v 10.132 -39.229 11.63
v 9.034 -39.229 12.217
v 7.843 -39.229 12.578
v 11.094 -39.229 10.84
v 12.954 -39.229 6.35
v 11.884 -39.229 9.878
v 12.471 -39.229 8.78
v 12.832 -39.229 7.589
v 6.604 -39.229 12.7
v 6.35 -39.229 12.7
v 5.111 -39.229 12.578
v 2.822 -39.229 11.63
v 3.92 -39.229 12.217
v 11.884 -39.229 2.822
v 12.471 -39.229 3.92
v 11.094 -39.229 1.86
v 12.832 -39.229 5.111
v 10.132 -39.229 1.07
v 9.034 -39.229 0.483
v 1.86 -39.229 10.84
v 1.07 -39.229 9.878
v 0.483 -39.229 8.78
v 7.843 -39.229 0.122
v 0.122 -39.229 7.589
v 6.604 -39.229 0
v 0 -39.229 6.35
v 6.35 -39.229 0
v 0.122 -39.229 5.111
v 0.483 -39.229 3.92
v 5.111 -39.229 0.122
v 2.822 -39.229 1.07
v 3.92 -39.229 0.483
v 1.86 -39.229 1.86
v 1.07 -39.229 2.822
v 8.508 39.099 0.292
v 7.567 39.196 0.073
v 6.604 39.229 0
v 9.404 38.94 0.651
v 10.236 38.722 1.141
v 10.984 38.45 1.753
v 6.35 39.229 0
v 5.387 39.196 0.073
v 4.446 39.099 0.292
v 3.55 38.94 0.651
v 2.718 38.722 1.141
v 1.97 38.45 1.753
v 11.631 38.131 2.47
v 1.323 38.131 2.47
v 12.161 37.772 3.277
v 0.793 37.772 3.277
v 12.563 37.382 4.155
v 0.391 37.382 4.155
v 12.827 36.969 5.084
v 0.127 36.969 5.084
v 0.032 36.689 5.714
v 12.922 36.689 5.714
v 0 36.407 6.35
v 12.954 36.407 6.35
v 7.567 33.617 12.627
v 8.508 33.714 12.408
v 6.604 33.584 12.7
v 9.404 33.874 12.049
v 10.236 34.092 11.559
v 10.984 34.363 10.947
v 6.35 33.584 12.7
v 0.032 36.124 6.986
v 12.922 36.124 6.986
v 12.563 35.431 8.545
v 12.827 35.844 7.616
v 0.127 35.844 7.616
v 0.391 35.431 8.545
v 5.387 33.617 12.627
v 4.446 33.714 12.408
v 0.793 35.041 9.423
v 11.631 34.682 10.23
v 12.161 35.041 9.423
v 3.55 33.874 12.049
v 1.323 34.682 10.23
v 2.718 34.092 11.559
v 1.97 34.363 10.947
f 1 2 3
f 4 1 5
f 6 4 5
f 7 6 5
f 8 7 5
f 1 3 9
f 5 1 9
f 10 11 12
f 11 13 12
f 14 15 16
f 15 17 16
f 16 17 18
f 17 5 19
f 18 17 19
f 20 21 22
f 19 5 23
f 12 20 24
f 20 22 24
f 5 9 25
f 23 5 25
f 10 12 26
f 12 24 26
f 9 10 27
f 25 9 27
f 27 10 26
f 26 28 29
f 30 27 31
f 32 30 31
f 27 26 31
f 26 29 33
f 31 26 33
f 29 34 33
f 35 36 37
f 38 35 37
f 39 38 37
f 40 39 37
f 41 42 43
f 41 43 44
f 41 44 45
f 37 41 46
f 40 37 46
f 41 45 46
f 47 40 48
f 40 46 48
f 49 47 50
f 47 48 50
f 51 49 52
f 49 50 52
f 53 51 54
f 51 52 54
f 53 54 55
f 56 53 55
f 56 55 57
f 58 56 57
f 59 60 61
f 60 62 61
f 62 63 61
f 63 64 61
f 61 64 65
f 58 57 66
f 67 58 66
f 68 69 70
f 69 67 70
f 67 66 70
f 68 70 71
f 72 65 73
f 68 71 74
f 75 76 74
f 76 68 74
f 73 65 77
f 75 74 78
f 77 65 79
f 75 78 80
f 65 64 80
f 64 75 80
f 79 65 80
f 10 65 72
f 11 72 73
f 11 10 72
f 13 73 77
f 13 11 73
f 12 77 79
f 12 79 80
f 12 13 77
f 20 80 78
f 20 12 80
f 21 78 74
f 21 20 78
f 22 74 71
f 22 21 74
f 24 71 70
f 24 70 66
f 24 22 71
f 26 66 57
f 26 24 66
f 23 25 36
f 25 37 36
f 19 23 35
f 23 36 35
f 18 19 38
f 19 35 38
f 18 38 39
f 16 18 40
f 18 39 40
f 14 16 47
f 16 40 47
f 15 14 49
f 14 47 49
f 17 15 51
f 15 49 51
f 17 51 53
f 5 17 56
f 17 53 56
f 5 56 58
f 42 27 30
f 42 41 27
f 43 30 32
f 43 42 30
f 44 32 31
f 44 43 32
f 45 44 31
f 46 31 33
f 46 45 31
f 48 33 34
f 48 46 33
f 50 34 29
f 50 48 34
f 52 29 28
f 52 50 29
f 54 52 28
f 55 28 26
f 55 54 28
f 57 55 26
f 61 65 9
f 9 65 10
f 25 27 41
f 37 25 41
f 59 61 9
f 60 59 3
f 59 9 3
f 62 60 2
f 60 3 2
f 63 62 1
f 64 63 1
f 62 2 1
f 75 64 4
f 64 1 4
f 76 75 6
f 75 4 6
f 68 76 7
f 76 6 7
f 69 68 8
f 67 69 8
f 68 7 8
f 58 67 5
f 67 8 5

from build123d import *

# Parameters (mm, degrees)
F2_DEPTH = 12.954
F3_R     = 6.34999


# Not quite as in the source:
# - a fillet or chamfer is up to 0.001 mm smaller than in the source, because OpenCascade refuses the exact size


with BuildPart() as f2:
    # F1 (on Right) → F2 (new body)
    with BuildSketch(Plane.YZ):
        Polygon((-39.228890075, 12.7), (-39.228890075, 0), (39.228890075, 0), (33.5844452765, 12.7), align=None)
    extrude(amount=F2_DEPTH)

    # F3 (radius 6.35 in the source; OpenCascade refuses exactly that, so slightly less here)
    f3_edges = [f2.edges().sort_by_distance(p)[0] for p in [
        (12.954, 0, 0),
        (12.954, -2.822222, 12.7),
        (0, -2.822222, 12.7),
        (0, 0, 0),
    ]]
    fillet(f3_edges, radius=F3_R)


solid = f2.part
